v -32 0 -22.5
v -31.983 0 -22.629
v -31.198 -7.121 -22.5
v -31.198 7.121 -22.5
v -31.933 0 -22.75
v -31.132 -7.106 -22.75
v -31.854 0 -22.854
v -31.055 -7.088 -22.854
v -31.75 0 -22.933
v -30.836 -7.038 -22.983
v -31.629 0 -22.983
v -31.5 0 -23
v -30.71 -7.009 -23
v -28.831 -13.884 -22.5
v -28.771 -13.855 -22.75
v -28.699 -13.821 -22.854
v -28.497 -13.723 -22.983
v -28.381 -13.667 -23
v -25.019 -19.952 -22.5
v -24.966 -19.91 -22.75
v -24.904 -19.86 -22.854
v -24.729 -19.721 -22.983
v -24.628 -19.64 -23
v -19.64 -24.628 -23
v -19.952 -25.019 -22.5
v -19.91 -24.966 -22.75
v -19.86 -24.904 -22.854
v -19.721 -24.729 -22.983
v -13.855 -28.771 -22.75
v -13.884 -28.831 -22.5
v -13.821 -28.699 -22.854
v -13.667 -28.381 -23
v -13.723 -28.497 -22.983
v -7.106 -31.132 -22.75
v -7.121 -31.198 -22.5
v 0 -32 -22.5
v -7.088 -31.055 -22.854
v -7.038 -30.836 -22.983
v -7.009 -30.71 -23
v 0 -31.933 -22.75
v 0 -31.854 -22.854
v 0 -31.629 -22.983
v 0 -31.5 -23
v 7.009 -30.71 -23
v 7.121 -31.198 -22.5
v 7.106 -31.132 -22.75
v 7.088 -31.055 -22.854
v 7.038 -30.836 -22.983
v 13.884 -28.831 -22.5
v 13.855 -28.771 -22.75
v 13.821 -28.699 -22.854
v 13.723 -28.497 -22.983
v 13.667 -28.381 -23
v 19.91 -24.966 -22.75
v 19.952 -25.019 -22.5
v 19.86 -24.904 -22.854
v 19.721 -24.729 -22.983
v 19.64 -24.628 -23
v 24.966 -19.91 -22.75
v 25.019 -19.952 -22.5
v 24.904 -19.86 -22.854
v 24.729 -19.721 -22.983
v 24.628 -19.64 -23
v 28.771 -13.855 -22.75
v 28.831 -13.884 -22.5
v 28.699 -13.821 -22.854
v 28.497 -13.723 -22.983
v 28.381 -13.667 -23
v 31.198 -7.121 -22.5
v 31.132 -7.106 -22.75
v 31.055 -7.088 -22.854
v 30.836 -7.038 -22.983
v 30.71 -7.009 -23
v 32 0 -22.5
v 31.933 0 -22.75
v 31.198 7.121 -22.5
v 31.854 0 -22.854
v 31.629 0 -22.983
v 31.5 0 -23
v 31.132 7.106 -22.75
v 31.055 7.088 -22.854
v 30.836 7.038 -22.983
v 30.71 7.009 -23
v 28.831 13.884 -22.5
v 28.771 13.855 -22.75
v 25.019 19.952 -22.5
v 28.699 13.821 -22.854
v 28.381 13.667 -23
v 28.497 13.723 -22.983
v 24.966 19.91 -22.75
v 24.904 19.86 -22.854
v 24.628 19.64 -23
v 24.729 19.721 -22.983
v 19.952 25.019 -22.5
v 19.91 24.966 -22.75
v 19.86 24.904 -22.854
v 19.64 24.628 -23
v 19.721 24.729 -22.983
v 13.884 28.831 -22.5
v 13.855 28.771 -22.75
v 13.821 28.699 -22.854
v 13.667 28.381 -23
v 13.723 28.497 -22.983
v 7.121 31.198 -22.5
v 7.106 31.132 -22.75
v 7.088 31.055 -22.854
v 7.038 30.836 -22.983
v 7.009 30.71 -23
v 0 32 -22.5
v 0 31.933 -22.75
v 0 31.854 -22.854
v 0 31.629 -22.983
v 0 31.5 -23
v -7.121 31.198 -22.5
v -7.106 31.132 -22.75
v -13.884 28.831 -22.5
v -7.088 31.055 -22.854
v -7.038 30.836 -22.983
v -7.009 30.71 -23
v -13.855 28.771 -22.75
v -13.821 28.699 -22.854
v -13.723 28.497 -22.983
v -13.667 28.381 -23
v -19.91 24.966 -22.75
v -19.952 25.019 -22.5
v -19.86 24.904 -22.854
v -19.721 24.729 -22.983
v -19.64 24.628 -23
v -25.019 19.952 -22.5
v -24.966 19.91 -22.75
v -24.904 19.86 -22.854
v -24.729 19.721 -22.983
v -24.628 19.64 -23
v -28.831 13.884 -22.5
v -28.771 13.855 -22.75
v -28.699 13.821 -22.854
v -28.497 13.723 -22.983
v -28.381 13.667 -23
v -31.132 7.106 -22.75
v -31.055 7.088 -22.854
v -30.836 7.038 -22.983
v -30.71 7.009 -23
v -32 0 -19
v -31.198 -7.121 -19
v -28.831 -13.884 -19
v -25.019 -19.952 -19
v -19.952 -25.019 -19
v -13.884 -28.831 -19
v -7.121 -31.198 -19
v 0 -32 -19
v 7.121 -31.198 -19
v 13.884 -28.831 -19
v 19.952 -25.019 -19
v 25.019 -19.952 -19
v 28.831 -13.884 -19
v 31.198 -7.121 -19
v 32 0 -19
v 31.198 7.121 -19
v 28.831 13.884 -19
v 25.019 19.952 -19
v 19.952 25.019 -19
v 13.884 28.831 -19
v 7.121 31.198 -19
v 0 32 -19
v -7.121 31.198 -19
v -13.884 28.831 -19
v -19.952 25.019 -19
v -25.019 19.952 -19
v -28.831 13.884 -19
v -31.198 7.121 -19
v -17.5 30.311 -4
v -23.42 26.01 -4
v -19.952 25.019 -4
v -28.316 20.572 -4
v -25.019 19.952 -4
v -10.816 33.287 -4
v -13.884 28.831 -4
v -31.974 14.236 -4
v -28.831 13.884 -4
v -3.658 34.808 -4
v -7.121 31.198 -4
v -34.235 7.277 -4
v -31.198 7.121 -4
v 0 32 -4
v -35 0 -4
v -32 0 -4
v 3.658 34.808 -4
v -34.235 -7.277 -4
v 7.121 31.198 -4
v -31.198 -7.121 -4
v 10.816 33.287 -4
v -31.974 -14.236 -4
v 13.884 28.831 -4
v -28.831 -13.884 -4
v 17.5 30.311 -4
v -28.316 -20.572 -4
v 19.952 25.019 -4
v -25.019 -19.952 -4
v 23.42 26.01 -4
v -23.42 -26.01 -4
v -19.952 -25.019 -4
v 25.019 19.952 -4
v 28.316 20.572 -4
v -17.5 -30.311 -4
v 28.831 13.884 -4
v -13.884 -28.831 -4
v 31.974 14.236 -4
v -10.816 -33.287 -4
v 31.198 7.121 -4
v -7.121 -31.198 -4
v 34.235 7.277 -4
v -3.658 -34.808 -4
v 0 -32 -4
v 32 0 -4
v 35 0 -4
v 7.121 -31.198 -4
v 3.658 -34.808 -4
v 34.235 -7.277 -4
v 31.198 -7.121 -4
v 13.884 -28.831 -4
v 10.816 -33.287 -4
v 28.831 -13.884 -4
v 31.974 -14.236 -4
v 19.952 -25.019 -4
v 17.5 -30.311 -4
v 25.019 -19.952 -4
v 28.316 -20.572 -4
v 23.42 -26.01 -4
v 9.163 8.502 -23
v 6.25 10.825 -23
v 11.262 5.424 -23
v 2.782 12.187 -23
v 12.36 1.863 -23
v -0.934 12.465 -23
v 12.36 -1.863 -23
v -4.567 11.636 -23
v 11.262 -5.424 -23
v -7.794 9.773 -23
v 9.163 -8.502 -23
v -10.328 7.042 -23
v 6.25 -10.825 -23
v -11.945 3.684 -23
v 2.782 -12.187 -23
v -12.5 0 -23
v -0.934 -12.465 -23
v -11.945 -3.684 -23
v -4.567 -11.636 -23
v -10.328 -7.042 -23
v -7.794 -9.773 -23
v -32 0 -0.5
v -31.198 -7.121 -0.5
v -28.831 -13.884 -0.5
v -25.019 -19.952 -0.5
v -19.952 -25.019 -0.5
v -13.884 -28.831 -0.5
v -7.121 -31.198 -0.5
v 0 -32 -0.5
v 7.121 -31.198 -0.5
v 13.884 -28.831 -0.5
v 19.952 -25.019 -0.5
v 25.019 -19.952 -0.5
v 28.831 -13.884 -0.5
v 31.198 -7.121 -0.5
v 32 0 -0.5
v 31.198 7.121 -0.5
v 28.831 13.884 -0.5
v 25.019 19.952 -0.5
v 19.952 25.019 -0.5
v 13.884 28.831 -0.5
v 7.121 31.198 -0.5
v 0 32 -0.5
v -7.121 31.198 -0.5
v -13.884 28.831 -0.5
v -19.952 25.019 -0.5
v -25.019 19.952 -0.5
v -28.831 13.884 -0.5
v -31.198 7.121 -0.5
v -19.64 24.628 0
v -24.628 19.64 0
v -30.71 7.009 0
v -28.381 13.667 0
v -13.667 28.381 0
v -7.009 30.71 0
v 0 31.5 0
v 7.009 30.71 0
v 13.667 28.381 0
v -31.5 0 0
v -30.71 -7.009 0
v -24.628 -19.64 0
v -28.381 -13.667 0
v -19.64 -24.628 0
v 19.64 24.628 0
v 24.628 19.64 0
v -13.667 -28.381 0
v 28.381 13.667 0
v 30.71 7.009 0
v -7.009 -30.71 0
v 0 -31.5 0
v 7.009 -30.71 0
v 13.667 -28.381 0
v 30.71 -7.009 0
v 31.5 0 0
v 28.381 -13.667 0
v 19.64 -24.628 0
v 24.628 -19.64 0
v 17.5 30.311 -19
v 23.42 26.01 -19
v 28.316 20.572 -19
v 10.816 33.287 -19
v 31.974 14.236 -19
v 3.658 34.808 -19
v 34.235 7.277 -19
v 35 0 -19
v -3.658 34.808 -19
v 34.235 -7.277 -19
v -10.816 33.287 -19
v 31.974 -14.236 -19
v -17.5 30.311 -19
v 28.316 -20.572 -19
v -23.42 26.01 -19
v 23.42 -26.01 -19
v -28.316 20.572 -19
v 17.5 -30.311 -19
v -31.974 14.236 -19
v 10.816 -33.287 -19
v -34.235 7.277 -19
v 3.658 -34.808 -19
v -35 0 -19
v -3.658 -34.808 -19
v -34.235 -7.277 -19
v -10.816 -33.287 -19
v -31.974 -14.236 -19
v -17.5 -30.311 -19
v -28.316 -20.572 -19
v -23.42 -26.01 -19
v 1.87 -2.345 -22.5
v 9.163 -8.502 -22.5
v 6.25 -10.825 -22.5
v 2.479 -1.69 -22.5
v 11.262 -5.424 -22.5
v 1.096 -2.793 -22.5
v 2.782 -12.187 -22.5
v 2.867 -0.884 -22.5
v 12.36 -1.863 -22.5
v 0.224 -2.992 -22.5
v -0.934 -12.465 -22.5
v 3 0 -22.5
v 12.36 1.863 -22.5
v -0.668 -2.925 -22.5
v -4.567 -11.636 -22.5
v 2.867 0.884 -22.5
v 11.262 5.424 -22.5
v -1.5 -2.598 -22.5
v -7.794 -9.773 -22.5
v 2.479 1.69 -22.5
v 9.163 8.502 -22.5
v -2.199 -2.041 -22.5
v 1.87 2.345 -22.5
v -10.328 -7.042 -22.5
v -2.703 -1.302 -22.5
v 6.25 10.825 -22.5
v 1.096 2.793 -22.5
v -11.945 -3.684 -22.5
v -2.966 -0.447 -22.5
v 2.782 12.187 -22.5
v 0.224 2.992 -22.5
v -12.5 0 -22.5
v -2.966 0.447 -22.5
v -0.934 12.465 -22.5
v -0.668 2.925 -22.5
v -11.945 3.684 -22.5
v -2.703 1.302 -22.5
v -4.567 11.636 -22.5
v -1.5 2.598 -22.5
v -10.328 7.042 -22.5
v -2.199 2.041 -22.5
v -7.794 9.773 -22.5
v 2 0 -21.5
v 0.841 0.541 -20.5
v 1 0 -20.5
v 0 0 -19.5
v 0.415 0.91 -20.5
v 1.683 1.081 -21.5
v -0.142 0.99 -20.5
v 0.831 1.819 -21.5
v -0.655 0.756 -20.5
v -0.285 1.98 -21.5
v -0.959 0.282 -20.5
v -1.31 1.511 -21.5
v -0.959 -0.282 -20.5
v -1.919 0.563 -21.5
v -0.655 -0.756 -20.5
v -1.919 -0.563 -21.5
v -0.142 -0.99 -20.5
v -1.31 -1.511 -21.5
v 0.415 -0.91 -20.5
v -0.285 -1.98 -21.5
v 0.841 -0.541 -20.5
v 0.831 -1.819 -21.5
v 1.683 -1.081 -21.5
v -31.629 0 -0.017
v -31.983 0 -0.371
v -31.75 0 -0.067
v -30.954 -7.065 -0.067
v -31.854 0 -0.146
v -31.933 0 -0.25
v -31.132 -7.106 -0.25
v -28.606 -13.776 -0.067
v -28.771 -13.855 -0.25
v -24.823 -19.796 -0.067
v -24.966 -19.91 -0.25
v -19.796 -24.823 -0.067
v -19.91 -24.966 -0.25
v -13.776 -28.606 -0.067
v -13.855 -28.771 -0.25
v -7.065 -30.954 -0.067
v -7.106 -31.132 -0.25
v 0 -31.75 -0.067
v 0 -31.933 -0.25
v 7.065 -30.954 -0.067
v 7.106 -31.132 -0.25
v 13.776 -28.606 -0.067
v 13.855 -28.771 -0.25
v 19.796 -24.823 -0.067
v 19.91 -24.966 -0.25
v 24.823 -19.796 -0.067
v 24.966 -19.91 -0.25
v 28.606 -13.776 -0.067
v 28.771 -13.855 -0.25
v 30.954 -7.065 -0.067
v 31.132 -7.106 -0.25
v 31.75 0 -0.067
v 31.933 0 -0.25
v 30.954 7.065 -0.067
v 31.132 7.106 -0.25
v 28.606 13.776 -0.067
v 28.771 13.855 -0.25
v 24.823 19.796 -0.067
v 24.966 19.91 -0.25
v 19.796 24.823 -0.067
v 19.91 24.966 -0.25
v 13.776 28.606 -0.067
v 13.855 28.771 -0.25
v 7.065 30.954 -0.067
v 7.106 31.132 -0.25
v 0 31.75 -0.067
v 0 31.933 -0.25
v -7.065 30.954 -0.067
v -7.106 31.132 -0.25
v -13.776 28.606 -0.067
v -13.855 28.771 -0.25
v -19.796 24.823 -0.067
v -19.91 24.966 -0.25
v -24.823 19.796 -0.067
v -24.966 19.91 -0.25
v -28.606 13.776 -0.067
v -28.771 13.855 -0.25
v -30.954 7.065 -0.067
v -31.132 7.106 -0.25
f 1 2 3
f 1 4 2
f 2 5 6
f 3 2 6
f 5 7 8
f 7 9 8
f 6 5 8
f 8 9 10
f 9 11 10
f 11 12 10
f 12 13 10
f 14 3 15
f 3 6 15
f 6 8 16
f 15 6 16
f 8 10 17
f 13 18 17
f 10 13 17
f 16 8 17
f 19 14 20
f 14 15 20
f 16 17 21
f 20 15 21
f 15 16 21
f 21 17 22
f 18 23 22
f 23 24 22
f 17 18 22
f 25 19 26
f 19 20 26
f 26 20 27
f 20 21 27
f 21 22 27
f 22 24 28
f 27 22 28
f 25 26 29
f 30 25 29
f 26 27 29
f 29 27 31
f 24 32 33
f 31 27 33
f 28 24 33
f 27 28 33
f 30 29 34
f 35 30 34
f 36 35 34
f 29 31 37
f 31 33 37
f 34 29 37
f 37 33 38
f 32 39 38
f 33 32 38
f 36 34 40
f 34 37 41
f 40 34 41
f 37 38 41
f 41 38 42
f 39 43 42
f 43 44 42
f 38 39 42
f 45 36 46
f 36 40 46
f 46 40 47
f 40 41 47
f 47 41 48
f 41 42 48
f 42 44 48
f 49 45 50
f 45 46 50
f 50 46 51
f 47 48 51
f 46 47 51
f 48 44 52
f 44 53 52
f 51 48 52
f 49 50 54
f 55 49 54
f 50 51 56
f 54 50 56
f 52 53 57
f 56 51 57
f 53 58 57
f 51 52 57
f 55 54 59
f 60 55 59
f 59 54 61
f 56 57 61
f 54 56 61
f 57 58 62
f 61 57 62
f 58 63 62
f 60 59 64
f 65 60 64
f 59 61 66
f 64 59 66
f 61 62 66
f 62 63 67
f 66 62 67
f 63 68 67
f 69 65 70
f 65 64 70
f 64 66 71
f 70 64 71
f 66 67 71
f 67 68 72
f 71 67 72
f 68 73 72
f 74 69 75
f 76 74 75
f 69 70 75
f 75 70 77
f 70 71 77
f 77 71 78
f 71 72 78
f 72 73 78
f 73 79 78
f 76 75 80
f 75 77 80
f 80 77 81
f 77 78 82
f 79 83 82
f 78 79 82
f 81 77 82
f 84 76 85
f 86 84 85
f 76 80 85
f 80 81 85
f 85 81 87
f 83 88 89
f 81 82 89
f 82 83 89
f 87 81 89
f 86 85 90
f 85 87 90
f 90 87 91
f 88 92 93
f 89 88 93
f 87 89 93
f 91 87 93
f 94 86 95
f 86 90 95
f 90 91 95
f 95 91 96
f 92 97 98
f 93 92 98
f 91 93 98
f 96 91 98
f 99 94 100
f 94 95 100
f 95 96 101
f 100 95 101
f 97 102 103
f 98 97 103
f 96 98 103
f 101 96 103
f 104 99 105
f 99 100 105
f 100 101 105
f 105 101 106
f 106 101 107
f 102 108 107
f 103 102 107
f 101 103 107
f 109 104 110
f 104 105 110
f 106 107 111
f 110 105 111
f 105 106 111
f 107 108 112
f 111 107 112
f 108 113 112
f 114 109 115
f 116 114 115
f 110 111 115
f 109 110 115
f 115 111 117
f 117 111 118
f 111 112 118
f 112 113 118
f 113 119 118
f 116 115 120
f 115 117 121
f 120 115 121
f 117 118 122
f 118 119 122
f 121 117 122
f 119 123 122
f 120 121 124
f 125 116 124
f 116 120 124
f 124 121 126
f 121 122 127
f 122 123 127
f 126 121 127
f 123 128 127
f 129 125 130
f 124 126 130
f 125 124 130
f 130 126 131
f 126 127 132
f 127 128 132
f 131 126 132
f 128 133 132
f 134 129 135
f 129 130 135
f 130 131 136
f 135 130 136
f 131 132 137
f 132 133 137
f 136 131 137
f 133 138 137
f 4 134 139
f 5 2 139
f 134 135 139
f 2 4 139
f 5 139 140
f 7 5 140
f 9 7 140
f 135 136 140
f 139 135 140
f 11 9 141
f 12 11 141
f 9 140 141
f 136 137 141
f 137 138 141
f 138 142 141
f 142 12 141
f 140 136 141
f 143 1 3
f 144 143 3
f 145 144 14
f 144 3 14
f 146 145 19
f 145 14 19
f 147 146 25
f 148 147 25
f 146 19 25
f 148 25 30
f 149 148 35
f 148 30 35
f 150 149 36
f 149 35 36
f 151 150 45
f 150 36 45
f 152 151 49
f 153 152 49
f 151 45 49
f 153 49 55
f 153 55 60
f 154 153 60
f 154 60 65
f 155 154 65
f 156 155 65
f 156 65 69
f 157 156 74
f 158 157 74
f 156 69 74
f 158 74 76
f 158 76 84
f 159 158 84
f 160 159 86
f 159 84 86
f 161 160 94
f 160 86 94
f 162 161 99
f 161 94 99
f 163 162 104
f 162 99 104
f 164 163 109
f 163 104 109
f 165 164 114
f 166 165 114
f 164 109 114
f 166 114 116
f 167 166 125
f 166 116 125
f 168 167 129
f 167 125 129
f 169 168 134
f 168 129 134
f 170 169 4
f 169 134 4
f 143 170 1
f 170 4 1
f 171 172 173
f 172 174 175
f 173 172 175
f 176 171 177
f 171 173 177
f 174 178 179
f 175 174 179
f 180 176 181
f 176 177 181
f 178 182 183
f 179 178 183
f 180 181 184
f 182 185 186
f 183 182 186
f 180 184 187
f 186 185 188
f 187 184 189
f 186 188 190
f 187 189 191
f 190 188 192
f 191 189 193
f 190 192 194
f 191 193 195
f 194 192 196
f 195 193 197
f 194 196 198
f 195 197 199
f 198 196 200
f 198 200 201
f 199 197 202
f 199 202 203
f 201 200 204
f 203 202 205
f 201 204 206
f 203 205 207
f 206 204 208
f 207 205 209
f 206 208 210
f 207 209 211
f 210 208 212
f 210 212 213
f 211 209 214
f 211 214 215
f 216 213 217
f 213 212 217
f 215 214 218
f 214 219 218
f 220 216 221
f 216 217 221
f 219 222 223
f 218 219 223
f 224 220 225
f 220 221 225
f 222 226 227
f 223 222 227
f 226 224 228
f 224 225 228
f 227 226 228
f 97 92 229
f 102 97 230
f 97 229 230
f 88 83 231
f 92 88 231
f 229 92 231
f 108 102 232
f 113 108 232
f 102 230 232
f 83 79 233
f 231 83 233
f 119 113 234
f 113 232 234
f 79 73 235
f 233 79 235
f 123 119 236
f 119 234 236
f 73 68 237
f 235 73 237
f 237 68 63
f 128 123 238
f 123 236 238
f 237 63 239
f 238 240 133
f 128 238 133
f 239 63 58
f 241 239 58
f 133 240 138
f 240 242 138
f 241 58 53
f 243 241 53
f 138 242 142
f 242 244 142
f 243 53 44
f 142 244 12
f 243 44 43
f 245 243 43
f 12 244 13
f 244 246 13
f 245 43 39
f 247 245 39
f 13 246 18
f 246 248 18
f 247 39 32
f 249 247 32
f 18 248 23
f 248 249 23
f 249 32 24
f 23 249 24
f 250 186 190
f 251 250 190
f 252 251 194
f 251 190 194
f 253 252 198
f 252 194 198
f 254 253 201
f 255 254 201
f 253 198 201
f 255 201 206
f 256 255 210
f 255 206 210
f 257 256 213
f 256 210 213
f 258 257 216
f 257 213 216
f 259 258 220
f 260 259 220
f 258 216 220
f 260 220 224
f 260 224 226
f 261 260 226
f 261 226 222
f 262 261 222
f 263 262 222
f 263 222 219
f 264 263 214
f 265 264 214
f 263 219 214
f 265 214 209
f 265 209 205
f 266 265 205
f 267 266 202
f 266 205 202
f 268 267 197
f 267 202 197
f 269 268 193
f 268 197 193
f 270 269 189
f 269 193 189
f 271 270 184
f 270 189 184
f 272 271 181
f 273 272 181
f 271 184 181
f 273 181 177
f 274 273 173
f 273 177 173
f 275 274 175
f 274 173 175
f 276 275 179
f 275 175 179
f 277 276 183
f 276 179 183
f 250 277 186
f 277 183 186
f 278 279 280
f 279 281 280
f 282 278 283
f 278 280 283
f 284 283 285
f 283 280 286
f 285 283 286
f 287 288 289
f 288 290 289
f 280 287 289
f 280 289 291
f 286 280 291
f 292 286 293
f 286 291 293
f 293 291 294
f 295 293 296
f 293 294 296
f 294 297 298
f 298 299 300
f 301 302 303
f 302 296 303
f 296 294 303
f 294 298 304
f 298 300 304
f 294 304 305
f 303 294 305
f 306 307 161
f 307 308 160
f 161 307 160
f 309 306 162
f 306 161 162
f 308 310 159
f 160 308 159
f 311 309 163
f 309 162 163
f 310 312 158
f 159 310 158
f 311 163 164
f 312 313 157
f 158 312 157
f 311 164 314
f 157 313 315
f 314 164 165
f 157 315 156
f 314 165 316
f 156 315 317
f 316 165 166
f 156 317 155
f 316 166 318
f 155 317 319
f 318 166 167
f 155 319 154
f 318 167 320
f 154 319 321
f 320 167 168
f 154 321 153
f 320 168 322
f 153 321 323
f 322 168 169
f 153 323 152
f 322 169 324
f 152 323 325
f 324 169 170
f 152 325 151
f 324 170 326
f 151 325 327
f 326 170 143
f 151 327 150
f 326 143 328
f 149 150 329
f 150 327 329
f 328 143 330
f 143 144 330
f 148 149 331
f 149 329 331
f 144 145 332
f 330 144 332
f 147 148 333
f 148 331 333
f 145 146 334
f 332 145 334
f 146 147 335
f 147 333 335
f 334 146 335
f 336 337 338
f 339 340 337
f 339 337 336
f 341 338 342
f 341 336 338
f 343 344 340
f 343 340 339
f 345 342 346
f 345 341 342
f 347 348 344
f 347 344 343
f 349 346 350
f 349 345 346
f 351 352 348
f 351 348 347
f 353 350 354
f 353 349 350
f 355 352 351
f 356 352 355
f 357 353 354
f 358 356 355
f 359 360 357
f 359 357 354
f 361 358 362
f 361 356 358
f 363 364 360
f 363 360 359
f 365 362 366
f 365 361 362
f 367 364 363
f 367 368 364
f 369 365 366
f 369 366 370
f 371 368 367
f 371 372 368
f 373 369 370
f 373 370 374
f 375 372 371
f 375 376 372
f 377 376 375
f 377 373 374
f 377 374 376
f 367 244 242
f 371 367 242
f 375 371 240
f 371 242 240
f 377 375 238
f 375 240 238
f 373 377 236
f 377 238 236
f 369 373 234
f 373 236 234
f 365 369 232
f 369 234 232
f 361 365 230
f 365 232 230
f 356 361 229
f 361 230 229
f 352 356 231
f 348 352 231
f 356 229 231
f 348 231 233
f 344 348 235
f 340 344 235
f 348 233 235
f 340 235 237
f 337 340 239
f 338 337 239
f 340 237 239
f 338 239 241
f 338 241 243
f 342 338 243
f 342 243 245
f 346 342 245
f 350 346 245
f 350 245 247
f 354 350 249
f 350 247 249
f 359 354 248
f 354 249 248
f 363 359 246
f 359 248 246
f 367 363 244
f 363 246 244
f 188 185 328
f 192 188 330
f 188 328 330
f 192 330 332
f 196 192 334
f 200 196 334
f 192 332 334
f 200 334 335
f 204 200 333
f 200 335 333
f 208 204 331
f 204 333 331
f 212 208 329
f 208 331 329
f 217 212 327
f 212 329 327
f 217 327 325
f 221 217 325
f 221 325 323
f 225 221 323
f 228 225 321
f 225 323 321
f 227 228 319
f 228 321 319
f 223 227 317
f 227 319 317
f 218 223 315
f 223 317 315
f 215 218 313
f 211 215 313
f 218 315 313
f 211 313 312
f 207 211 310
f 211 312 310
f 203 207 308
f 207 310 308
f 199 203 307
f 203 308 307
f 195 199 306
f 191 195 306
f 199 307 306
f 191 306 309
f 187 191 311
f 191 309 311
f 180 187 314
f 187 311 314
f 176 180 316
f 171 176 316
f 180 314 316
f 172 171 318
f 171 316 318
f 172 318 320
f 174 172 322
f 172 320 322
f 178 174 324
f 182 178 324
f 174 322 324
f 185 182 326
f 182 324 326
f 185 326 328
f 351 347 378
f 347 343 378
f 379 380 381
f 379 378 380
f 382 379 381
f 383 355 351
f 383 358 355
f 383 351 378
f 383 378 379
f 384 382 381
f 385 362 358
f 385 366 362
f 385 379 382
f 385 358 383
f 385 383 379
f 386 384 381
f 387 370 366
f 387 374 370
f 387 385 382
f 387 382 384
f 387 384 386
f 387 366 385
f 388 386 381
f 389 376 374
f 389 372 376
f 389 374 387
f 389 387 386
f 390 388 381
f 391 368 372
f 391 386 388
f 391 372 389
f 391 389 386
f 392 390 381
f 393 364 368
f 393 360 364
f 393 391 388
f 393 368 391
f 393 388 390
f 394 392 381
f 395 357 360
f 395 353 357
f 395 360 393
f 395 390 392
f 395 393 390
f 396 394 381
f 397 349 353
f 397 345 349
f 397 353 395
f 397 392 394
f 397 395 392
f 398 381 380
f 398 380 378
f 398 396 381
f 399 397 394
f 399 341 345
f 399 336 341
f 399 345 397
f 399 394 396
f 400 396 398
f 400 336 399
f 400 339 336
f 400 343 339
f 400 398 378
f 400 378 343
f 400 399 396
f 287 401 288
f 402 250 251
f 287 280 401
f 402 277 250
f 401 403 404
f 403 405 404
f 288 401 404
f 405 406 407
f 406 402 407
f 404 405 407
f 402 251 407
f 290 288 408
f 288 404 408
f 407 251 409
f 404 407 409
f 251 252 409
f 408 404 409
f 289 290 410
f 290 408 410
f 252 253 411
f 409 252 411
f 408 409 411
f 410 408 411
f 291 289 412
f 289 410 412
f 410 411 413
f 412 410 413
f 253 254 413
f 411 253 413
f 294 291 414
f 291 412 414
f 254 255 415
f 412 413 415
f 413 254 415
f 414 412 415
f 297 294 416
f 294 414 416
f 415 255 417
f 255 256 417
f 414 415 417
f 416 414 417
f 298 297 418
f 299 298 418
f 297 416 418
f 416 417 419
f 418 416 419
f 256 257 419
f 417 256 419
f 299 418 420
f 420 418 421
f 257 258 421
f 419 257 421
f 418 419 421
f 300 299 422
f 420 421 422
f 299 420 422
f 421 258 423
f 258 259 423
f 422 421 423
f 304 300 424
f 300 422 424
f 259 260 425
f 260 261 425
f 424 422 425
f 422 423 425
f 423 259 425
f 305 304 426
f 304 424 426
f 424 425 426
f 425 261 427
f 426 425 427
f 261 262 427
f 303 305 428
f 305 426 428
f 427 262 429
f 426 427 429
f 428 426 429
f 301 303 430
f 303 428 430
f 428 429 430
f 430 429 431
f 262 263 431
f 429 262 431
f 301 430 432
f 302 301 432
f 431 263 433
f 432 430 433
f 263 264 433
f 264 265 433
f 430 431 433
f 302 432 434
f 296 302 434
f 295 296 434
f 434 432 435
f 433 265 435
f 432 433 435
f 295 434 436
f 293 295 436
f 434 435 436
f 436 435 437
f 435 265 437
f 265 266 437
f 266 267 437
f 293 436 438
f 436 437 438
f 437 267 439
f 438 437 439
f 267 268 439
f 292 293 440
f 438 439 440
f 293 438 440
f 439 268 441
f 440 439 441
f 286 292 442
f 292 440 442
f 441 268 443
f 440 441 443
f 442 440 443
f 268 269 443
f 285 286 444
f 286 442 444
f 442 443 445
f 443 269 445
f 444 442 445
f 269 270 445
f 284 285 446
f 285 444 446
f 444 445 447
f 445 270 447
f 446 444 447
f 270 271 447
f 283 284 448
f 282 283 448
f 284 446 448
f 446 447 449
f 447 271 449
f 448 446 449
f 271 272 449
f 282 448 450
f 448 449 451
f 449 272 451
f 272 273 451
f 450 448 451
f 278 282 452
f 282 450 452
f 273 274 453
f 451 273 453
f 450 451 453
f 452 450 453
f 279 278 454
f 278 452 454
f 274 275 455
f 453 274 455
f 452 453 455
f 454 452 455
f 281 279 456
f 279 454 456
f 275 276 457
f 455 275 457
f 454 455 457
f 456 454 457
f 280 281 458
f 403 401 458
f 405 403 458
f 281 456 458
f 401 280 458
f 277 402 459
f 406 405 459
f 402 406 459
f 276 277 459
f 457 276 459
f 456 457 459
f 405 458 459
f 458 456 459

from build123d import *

# Parameters (mm, degrees)
FILLET_1_R          = 0.5
SKETCH_2_R          = 12.5
CUT_EXTRUDE_1_DEPTH = 0.5


with BuildPart() as part:
    # Эскиз1 → Повернуть1 (revolve)
    with BuildSketch(Plane(origin=(0, 0, 0), x_dir=(1, 0, 0), z_dir=(0, 1, 0))):
        Polygon((0, 0), (-32, 0), (-32, 4), (-35, 4), (-35, 19), (-32, 19), (-32, 23), (0, 23), align=None)
    revolve(axis=Axis((0, 0, -23), (0, 0, 1)))

    # Скругление1
    fillet_1_edges = [part.edges().sort_by_distance(p)[0] for p in [
        (32, 0, -23),
        (32, 0, 0),
    ]]
    fillet(fillet_1_edges, radius=FILLET_1_R)

    # Эскиз2 → Вырез-Вытянуть1 (cut)
    with BuildSketch(Plane(origin=(0, 0, -23), x_dir=(-1, 0, 0), z_dir=(0, 0, -1))):
        Circle(SKETCH_2_R)
    extrude(amount=-CUT_EXTRUDE_1_DEPTH, mode=Mode.SUBTRACT)

    # Эскиз3 → Вырез-Повернуть1 (revolve, cut)
    with BuildSketch(Plane(origin=(0, 0, 0), x_dir=(0, 0, -1), z_dir=(1, 0, 0)), mode=Mode.PRIVATE) as cut_revolve_1_sk:
        Polygon((22.5, 0), (19.5, 0), (22.5, 3), align=None)
    revolve(cut_revolve_1_sk.sketch.rotate(Axis((0, 0, -22.5), (0, 0, 1)), 270), axis=Axis((0, 0, -22.5), (0, 0, 1)), mode=Mode.SUBTRACT)


solid = part.part
